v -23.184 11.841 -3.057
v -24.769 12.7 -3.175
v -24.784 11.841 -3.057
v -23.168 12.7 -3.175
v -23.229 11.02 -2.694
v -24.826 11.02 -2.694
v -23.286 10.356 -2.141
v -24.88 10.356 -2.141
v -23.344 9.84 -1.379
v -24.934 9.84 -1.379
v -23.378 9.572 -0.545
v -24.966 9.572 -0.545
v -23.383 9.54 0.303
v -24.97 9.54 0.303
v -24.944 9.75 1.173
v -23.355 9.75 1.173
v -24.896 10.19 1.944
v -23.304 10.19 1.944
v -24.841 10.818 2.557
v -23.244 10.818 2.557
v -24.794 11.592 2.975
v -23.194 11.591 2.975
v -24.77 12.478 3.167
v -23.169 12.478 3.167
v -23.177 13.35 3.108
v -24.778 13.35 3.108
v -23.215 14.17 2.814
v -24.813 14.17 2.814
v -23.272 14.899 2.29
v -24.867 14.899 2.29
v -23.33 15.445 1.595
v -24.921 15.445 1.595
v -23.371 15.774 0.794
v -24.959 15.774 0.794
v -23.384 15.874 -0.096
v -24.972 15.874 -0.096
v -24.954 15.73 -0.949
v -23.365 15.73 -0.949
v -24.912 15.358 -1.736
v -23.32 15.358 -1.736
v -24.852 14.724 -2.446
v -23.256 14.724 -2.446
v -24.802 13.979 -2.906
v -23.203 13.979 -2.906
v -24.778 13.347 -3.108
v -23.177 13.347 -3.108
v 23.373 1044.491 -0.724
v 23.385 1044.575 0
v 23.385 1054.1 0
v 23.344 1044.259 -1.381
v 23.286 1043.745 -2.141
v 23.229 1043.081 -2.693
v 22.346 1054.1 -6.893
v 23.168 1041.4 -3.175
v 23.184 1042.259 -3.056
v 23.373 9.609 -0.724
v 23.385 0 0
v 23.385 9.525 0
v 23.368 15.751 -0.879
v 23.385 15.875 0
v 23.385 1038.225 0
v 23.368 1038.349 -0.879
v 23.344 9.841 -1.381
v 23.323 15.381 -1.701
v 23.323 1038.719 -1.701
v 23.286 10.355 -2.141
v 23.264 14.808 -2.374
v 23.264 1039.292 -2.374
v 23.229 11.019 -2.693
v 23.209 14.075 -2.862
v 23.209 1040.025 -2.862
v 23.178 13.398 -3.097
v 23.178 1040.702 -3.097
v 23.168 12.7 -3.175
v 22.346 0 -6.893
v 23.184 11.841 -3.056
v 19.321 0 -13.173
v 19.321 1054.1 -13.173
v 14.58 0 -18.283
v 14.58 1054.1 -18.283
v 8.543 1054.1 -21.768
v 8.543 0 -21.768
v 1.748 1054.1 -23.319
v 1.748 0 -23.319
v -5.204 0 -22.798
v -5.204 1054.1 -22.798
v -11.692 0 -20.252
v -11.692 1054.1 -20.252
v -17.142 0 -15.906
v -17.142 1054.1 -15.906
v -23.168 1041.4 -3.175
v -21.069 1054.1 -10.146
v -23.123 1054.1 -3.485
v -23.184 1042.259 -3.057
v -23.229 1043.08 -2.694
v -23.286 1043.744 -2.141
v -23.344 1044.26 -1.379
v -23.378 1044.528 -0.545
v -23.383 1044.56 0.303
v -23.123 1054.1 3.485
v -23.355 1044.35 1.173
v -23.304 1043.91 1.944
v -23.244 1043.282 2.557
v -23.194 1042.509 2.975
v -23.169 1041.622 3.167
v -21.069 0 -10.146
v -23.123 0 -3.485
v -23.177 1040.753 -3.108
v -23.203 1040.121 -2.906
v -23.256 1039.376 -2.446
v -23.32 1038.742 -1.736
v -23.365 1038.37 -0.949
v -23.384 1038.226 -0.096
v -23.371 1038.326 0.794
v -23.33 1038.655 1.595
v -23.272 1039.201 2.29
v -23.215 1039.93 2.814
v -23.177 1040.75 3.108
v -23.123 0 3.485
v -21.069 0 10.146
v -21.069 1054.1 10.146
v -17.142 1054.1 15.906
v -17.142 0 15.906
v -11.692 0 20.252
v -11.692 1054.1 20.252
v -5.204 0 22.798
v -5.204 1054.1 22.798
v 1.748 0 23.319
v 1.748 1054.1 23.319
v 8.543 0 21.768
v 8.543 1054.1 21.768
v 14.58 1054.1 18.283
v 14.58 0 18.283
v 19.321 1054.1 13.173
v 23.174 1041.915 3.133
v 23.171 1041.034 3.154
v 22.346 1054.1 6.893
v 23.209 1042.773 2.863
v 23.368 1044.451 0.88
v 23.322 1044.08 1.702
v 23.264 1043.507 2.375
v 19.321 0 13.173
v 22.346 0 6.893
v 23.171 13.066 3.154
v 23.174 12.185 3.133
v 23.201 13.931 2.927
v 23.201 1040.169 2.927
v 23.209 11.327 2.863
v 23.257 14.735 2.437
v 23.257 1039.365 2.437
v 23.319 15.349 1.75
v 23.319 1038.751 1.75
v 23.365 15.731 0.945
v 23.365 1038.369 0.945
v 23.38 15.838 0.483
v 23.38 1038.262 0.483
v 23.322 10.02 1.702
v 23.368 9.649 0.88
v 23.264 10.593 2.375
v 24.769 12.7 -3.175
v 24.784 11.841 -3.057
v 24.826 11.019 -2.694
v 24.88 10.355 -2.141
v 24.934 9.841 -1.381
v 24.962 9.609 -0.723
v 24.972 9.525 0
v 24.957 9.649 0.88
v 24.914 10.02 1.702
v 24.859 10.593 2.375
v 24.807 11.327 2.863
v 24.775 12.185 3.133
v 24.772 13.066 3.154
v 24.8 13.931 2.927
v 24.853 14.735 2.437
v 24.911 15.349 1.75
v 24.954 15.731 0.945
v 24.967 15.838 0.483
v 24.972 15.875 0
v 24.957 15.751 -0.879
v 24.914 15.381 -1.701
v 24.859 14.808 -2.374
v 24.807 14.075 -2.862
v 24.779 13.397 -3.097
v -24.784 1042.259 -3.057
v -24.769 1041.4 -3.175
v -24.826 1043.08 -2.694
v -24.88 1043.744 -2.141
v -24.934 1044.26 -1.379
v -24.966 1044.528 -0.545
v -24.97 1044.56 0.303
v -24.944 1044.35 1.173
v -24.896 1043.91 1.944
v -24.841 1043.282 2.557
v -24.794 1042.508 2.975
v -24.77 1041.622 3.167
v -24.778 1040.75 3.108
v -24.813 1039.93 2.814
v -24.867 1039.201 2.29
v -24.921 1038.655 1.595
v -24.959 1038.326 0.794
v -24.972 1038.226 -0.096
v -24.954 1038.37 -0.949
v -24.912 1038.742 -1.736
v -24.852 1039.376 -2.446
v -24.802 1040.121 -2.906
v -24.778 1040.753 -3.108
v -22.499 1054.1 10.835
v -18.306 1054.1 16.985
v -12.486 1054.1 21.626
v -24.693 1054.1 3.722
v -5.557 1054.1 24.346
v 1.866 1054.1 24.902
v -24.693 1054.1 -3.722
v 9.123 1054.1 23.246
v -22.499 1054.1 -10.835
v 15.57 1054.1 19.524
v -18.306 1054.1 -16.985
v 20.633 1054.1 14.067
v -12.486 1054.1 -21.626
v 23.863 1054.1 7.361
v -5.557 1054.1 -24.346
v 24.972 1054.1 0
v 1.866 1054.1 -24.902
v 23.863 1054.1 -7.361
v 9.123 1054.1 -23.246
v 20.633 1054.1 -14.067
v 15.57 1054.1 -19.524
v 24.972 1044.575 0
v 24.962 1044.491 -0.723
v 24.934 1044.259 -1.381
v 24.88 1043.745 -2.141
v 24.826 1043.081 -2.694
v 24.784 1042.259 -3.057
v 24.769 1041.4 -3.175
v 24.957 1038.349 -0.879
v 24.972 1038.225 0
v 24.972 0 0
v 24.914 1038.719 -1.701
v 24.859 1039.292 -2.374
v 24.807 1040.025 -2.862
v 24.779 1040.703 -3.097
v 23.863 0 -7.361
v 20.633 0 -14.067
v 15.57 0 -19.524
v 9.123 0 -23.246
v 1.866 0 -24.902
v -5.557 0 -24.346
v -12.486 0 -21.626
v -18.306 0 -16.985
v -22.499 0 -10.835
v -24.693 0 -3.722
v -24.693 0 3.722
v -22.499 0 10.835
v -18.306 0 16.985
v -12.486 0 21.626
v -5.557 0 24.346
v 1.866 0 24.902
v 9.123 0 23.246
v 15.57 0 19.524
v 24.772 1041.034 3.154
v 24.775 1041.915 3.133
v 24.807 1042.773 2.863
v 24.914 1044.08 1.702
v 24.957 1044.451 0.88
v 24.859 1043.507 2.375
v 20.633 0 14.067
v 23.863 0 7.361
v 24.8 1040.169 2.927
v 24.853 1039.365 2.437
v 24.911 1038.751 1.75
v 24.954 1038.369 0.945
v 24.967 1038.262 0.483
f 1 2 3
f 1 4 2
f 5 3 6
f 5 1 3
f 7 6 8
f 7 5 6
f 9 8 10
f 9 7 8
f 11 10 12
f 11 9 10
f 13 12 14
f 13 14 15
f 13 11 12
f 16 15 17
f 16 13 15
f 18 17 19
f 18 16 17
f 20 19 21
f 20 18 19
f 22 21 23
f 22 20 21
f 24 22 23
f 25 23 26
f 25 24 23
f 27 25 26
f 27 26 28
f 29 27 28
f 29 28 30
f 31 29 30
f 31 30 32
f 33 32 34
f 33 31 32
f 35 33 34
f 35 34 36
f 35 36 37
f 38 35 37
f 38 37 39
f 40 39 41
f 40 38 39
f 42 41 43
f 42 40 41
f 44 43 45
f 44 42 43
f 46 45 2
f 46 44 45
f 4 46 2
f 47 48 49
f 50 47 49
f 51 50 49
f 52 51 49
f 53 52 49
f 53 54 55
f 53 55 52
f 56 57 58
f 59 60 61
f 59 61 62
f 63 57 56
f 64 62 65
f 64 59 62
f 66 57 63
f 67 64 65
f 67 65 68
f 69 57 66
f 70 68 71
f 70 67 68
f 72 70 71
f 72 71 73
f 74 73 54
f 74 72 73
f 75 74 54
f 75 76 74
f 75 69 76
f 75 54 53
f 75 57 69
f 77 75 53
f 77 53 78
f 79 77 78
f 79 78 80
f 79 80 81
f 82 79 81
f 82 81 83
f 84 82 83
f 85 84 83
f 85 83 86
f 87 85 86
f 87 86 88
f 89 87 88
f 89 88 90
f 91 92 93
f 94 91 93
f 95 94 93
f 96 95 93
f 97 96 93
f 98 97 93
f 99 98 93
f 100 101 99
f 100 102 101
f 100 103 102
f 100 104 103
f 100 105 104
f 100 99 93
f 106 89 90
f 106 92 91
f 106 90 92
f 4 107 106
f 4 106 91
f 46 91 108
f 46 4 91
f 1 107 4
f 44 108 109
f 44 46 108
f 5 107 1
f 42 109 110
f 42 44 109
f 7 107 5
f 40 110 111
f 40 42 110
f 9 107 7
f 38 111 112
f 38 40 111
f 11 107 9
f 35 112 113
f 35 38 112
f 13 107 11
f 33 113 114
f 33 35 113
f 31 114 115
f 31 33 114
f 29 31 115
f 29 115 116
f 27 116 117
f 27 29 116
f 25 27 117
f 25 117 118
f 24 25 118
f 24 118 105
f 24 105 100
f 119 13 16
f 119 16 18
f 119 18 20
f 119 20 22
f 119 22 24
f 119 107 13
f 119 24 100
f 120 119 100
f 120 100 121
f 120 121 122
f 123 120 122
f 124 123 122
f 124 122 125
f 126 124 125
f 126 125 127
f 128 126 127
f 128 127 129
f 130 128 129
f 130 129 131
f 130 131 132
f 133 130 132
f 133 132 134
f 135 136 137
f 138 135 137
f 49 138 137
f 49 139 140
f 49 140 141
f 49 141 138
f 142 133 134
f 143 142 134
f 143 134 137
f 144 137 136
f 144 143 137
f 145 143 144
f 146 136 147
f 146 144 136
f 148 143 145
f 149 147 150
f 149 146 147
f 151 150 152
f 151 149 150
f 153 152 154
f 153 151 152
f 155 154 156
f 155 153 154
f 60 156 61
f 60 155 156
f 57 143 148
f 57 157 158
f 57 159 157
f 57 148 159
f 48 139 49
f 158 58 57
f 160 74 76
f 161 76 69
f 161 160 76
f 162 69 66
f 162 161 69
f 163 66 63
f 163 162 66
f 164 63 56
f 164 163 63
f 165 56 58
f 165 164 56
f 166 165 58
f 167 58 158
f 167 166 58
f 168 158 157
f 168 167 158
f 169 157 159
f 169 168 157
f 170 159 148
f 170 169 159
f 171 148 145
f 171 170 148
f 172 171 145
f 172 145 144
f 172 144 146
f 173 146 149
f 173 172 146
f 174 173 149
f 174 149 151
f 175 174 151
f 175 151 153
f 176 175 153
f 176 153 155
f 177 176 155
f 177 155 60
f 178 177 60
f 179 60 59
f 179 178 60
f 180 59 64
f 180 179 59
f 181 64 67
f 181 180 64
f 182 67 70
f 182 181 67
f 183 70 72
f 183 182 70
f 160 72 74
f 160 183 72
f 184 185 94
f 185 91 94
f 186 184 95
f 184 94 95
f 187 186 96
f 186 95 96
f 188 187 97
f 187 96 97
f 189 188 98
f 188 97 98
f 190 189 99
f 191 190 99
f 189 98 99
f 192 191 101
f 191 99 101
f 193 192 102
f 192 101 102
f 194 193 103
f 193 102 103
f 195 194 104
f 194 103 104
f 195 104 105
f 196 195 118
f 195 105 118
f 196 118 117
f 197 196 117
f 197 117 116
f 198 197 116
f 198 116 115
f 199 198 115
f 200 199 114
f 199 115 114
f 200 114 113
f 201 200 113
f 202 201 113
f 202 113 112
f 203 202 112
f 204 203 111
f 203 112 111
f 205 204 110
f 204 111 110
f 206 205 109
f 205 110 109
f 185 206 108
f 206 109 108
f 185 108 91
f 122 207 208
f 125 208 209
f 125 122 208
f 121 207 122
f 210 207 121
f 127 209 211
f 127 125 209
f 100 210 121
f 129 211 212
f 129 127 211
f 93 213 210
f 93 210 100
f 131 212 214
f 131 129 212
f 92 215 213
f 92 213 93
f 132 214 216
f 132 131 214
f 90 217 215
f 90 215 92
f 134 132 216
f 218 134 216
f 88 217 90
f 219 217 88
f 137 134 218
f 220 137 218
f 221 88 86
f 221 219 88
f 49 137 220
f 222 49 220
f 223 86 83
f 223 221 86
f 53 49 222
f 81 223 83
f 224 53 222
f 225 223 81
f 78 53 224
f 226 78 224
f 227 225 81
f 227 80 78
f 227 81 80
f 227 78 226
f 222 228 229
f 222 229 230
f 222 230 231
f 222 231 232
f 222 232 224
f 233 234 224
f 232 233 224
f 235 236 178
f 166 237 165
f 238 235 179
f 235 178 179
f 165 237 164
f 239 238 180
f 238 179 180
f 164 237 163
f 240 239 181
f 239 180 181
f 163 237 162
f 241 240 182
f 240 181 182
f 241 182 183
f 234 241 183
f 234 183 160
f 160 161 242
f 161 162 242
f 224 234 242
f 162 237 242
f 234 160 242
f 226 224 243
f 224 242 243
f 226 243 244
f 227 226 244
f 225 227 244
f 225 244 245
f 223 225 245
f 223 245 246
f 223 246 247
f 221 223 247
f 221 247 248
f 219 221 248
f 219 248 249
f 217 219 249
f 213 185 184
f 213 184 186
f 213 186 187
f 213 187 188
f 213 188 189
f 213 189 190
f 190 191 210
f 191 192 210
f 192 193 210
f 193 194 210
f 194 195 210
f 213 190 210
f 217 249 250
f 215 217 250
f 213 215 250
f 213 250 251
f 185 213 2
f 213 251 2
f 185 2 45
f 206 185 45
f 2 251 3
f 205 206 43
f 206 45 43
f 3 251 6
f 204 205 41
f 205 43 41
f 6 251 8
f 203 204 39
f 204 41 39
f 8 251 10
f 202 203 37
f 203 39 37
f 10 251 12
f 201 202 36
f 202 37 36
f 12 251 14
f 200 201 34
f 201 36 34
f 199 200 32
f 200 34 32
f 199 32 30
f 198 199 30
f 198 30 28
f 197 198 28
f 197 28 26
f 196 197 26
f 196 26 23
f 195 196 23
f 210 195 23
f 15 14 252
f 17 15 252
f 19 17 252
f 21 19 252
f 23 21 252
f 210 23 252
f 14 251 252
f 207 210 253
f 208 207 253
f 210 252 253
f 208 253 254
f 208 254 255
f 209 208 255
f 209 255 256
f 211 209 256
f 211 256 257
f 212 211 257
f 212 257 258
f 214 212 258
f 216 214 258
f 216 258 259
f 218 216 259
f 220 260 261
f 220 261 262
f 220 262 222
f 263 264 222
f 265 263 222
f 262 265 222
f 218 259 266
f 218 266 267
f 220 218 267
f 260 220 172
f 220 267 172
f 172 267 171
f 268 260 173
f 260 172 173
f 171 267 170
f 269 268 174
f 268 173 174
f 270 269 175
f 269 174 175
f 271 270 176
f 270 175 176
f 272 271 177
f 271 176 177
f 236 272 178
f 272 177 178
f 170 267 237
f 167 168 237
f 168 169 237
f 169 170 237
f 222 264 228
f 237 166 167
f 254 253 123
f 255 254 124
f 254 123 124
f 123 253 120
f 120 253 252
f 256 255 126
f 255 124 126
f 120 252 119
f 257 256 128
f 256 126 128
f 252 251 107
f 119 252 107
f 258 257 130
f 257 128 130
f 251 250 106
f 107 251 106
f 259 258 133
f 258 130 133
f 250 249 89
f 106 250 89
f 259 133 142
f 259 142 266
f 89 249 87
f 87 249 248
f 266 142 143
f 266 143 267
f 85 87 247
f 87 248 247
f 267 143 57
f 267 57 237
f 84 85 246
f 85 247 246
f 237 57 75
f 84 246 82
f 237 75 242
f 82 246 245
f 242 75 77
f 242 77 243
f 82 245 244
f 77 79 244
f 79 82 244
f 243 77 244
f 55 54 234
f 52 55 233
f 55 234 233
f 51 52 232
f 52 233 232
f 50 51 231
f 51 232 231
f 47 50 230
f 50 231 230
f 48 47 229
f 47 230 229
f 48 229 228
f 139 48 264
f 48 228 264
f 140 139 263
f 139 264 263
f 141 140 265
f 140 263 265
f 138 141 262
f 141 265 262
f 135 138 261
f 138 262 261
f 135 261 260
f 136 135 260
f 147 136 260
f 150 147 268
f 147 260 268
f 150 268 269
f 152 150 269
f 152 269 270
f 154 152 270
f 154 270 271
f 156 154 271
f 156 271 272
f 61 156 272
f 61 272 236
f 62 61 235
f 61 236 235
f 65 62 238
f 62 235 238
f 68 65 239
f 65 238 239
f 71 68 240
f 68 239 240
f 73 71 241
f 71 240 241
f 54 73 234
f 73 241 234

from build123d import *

# Parameters (mm, degrees)
SKETCH2_R           = 24.97201
SKETCH2_R_2         = 23.38451
EXTRUDE_THIN1_DEPTH = 1054.1
SKETCH4_R           = 3.175
CUT_EXTRUDE1_DEPTH  = 25.97201


with BuildPart() as part:
    # Sketch2 → Extrude-Thin1 (new body)
    with BuildSketch(Plane(origin=(0, 0, 0), x_dir=(1, 0, 0), z_dir=(0, 1, 0))):
        Circle(SKETCH2_R)
        Circle(SKETCH2_R_2, mode=Mode.SUBTRACT)
    extrude(amount=EXTRUDE_THIN1_DEPTH)

    # Sketch4 → Cut-Extrude1 (cut, symmetric)
    with BuildSketch(Plane(origin=(0, 0, 0), x_dir=(0, 0, -1), z_dir=(1, 0, 0))):
        with Locations((0, 1041.4)):
            Circle(SKETCH4_R)
    cut_extrude1 = extrude(amount=CUT_EXTRUDE1_DEPTH, both=True, mode=Mode.SUBTRACT)

    # Mirror1: Cut-Extrude1 across plane
    add(cut_extrude1.mirror(Plane.ZX.offset(527.05)), mode=Mode.SUBTRACT)


solid = part.part
